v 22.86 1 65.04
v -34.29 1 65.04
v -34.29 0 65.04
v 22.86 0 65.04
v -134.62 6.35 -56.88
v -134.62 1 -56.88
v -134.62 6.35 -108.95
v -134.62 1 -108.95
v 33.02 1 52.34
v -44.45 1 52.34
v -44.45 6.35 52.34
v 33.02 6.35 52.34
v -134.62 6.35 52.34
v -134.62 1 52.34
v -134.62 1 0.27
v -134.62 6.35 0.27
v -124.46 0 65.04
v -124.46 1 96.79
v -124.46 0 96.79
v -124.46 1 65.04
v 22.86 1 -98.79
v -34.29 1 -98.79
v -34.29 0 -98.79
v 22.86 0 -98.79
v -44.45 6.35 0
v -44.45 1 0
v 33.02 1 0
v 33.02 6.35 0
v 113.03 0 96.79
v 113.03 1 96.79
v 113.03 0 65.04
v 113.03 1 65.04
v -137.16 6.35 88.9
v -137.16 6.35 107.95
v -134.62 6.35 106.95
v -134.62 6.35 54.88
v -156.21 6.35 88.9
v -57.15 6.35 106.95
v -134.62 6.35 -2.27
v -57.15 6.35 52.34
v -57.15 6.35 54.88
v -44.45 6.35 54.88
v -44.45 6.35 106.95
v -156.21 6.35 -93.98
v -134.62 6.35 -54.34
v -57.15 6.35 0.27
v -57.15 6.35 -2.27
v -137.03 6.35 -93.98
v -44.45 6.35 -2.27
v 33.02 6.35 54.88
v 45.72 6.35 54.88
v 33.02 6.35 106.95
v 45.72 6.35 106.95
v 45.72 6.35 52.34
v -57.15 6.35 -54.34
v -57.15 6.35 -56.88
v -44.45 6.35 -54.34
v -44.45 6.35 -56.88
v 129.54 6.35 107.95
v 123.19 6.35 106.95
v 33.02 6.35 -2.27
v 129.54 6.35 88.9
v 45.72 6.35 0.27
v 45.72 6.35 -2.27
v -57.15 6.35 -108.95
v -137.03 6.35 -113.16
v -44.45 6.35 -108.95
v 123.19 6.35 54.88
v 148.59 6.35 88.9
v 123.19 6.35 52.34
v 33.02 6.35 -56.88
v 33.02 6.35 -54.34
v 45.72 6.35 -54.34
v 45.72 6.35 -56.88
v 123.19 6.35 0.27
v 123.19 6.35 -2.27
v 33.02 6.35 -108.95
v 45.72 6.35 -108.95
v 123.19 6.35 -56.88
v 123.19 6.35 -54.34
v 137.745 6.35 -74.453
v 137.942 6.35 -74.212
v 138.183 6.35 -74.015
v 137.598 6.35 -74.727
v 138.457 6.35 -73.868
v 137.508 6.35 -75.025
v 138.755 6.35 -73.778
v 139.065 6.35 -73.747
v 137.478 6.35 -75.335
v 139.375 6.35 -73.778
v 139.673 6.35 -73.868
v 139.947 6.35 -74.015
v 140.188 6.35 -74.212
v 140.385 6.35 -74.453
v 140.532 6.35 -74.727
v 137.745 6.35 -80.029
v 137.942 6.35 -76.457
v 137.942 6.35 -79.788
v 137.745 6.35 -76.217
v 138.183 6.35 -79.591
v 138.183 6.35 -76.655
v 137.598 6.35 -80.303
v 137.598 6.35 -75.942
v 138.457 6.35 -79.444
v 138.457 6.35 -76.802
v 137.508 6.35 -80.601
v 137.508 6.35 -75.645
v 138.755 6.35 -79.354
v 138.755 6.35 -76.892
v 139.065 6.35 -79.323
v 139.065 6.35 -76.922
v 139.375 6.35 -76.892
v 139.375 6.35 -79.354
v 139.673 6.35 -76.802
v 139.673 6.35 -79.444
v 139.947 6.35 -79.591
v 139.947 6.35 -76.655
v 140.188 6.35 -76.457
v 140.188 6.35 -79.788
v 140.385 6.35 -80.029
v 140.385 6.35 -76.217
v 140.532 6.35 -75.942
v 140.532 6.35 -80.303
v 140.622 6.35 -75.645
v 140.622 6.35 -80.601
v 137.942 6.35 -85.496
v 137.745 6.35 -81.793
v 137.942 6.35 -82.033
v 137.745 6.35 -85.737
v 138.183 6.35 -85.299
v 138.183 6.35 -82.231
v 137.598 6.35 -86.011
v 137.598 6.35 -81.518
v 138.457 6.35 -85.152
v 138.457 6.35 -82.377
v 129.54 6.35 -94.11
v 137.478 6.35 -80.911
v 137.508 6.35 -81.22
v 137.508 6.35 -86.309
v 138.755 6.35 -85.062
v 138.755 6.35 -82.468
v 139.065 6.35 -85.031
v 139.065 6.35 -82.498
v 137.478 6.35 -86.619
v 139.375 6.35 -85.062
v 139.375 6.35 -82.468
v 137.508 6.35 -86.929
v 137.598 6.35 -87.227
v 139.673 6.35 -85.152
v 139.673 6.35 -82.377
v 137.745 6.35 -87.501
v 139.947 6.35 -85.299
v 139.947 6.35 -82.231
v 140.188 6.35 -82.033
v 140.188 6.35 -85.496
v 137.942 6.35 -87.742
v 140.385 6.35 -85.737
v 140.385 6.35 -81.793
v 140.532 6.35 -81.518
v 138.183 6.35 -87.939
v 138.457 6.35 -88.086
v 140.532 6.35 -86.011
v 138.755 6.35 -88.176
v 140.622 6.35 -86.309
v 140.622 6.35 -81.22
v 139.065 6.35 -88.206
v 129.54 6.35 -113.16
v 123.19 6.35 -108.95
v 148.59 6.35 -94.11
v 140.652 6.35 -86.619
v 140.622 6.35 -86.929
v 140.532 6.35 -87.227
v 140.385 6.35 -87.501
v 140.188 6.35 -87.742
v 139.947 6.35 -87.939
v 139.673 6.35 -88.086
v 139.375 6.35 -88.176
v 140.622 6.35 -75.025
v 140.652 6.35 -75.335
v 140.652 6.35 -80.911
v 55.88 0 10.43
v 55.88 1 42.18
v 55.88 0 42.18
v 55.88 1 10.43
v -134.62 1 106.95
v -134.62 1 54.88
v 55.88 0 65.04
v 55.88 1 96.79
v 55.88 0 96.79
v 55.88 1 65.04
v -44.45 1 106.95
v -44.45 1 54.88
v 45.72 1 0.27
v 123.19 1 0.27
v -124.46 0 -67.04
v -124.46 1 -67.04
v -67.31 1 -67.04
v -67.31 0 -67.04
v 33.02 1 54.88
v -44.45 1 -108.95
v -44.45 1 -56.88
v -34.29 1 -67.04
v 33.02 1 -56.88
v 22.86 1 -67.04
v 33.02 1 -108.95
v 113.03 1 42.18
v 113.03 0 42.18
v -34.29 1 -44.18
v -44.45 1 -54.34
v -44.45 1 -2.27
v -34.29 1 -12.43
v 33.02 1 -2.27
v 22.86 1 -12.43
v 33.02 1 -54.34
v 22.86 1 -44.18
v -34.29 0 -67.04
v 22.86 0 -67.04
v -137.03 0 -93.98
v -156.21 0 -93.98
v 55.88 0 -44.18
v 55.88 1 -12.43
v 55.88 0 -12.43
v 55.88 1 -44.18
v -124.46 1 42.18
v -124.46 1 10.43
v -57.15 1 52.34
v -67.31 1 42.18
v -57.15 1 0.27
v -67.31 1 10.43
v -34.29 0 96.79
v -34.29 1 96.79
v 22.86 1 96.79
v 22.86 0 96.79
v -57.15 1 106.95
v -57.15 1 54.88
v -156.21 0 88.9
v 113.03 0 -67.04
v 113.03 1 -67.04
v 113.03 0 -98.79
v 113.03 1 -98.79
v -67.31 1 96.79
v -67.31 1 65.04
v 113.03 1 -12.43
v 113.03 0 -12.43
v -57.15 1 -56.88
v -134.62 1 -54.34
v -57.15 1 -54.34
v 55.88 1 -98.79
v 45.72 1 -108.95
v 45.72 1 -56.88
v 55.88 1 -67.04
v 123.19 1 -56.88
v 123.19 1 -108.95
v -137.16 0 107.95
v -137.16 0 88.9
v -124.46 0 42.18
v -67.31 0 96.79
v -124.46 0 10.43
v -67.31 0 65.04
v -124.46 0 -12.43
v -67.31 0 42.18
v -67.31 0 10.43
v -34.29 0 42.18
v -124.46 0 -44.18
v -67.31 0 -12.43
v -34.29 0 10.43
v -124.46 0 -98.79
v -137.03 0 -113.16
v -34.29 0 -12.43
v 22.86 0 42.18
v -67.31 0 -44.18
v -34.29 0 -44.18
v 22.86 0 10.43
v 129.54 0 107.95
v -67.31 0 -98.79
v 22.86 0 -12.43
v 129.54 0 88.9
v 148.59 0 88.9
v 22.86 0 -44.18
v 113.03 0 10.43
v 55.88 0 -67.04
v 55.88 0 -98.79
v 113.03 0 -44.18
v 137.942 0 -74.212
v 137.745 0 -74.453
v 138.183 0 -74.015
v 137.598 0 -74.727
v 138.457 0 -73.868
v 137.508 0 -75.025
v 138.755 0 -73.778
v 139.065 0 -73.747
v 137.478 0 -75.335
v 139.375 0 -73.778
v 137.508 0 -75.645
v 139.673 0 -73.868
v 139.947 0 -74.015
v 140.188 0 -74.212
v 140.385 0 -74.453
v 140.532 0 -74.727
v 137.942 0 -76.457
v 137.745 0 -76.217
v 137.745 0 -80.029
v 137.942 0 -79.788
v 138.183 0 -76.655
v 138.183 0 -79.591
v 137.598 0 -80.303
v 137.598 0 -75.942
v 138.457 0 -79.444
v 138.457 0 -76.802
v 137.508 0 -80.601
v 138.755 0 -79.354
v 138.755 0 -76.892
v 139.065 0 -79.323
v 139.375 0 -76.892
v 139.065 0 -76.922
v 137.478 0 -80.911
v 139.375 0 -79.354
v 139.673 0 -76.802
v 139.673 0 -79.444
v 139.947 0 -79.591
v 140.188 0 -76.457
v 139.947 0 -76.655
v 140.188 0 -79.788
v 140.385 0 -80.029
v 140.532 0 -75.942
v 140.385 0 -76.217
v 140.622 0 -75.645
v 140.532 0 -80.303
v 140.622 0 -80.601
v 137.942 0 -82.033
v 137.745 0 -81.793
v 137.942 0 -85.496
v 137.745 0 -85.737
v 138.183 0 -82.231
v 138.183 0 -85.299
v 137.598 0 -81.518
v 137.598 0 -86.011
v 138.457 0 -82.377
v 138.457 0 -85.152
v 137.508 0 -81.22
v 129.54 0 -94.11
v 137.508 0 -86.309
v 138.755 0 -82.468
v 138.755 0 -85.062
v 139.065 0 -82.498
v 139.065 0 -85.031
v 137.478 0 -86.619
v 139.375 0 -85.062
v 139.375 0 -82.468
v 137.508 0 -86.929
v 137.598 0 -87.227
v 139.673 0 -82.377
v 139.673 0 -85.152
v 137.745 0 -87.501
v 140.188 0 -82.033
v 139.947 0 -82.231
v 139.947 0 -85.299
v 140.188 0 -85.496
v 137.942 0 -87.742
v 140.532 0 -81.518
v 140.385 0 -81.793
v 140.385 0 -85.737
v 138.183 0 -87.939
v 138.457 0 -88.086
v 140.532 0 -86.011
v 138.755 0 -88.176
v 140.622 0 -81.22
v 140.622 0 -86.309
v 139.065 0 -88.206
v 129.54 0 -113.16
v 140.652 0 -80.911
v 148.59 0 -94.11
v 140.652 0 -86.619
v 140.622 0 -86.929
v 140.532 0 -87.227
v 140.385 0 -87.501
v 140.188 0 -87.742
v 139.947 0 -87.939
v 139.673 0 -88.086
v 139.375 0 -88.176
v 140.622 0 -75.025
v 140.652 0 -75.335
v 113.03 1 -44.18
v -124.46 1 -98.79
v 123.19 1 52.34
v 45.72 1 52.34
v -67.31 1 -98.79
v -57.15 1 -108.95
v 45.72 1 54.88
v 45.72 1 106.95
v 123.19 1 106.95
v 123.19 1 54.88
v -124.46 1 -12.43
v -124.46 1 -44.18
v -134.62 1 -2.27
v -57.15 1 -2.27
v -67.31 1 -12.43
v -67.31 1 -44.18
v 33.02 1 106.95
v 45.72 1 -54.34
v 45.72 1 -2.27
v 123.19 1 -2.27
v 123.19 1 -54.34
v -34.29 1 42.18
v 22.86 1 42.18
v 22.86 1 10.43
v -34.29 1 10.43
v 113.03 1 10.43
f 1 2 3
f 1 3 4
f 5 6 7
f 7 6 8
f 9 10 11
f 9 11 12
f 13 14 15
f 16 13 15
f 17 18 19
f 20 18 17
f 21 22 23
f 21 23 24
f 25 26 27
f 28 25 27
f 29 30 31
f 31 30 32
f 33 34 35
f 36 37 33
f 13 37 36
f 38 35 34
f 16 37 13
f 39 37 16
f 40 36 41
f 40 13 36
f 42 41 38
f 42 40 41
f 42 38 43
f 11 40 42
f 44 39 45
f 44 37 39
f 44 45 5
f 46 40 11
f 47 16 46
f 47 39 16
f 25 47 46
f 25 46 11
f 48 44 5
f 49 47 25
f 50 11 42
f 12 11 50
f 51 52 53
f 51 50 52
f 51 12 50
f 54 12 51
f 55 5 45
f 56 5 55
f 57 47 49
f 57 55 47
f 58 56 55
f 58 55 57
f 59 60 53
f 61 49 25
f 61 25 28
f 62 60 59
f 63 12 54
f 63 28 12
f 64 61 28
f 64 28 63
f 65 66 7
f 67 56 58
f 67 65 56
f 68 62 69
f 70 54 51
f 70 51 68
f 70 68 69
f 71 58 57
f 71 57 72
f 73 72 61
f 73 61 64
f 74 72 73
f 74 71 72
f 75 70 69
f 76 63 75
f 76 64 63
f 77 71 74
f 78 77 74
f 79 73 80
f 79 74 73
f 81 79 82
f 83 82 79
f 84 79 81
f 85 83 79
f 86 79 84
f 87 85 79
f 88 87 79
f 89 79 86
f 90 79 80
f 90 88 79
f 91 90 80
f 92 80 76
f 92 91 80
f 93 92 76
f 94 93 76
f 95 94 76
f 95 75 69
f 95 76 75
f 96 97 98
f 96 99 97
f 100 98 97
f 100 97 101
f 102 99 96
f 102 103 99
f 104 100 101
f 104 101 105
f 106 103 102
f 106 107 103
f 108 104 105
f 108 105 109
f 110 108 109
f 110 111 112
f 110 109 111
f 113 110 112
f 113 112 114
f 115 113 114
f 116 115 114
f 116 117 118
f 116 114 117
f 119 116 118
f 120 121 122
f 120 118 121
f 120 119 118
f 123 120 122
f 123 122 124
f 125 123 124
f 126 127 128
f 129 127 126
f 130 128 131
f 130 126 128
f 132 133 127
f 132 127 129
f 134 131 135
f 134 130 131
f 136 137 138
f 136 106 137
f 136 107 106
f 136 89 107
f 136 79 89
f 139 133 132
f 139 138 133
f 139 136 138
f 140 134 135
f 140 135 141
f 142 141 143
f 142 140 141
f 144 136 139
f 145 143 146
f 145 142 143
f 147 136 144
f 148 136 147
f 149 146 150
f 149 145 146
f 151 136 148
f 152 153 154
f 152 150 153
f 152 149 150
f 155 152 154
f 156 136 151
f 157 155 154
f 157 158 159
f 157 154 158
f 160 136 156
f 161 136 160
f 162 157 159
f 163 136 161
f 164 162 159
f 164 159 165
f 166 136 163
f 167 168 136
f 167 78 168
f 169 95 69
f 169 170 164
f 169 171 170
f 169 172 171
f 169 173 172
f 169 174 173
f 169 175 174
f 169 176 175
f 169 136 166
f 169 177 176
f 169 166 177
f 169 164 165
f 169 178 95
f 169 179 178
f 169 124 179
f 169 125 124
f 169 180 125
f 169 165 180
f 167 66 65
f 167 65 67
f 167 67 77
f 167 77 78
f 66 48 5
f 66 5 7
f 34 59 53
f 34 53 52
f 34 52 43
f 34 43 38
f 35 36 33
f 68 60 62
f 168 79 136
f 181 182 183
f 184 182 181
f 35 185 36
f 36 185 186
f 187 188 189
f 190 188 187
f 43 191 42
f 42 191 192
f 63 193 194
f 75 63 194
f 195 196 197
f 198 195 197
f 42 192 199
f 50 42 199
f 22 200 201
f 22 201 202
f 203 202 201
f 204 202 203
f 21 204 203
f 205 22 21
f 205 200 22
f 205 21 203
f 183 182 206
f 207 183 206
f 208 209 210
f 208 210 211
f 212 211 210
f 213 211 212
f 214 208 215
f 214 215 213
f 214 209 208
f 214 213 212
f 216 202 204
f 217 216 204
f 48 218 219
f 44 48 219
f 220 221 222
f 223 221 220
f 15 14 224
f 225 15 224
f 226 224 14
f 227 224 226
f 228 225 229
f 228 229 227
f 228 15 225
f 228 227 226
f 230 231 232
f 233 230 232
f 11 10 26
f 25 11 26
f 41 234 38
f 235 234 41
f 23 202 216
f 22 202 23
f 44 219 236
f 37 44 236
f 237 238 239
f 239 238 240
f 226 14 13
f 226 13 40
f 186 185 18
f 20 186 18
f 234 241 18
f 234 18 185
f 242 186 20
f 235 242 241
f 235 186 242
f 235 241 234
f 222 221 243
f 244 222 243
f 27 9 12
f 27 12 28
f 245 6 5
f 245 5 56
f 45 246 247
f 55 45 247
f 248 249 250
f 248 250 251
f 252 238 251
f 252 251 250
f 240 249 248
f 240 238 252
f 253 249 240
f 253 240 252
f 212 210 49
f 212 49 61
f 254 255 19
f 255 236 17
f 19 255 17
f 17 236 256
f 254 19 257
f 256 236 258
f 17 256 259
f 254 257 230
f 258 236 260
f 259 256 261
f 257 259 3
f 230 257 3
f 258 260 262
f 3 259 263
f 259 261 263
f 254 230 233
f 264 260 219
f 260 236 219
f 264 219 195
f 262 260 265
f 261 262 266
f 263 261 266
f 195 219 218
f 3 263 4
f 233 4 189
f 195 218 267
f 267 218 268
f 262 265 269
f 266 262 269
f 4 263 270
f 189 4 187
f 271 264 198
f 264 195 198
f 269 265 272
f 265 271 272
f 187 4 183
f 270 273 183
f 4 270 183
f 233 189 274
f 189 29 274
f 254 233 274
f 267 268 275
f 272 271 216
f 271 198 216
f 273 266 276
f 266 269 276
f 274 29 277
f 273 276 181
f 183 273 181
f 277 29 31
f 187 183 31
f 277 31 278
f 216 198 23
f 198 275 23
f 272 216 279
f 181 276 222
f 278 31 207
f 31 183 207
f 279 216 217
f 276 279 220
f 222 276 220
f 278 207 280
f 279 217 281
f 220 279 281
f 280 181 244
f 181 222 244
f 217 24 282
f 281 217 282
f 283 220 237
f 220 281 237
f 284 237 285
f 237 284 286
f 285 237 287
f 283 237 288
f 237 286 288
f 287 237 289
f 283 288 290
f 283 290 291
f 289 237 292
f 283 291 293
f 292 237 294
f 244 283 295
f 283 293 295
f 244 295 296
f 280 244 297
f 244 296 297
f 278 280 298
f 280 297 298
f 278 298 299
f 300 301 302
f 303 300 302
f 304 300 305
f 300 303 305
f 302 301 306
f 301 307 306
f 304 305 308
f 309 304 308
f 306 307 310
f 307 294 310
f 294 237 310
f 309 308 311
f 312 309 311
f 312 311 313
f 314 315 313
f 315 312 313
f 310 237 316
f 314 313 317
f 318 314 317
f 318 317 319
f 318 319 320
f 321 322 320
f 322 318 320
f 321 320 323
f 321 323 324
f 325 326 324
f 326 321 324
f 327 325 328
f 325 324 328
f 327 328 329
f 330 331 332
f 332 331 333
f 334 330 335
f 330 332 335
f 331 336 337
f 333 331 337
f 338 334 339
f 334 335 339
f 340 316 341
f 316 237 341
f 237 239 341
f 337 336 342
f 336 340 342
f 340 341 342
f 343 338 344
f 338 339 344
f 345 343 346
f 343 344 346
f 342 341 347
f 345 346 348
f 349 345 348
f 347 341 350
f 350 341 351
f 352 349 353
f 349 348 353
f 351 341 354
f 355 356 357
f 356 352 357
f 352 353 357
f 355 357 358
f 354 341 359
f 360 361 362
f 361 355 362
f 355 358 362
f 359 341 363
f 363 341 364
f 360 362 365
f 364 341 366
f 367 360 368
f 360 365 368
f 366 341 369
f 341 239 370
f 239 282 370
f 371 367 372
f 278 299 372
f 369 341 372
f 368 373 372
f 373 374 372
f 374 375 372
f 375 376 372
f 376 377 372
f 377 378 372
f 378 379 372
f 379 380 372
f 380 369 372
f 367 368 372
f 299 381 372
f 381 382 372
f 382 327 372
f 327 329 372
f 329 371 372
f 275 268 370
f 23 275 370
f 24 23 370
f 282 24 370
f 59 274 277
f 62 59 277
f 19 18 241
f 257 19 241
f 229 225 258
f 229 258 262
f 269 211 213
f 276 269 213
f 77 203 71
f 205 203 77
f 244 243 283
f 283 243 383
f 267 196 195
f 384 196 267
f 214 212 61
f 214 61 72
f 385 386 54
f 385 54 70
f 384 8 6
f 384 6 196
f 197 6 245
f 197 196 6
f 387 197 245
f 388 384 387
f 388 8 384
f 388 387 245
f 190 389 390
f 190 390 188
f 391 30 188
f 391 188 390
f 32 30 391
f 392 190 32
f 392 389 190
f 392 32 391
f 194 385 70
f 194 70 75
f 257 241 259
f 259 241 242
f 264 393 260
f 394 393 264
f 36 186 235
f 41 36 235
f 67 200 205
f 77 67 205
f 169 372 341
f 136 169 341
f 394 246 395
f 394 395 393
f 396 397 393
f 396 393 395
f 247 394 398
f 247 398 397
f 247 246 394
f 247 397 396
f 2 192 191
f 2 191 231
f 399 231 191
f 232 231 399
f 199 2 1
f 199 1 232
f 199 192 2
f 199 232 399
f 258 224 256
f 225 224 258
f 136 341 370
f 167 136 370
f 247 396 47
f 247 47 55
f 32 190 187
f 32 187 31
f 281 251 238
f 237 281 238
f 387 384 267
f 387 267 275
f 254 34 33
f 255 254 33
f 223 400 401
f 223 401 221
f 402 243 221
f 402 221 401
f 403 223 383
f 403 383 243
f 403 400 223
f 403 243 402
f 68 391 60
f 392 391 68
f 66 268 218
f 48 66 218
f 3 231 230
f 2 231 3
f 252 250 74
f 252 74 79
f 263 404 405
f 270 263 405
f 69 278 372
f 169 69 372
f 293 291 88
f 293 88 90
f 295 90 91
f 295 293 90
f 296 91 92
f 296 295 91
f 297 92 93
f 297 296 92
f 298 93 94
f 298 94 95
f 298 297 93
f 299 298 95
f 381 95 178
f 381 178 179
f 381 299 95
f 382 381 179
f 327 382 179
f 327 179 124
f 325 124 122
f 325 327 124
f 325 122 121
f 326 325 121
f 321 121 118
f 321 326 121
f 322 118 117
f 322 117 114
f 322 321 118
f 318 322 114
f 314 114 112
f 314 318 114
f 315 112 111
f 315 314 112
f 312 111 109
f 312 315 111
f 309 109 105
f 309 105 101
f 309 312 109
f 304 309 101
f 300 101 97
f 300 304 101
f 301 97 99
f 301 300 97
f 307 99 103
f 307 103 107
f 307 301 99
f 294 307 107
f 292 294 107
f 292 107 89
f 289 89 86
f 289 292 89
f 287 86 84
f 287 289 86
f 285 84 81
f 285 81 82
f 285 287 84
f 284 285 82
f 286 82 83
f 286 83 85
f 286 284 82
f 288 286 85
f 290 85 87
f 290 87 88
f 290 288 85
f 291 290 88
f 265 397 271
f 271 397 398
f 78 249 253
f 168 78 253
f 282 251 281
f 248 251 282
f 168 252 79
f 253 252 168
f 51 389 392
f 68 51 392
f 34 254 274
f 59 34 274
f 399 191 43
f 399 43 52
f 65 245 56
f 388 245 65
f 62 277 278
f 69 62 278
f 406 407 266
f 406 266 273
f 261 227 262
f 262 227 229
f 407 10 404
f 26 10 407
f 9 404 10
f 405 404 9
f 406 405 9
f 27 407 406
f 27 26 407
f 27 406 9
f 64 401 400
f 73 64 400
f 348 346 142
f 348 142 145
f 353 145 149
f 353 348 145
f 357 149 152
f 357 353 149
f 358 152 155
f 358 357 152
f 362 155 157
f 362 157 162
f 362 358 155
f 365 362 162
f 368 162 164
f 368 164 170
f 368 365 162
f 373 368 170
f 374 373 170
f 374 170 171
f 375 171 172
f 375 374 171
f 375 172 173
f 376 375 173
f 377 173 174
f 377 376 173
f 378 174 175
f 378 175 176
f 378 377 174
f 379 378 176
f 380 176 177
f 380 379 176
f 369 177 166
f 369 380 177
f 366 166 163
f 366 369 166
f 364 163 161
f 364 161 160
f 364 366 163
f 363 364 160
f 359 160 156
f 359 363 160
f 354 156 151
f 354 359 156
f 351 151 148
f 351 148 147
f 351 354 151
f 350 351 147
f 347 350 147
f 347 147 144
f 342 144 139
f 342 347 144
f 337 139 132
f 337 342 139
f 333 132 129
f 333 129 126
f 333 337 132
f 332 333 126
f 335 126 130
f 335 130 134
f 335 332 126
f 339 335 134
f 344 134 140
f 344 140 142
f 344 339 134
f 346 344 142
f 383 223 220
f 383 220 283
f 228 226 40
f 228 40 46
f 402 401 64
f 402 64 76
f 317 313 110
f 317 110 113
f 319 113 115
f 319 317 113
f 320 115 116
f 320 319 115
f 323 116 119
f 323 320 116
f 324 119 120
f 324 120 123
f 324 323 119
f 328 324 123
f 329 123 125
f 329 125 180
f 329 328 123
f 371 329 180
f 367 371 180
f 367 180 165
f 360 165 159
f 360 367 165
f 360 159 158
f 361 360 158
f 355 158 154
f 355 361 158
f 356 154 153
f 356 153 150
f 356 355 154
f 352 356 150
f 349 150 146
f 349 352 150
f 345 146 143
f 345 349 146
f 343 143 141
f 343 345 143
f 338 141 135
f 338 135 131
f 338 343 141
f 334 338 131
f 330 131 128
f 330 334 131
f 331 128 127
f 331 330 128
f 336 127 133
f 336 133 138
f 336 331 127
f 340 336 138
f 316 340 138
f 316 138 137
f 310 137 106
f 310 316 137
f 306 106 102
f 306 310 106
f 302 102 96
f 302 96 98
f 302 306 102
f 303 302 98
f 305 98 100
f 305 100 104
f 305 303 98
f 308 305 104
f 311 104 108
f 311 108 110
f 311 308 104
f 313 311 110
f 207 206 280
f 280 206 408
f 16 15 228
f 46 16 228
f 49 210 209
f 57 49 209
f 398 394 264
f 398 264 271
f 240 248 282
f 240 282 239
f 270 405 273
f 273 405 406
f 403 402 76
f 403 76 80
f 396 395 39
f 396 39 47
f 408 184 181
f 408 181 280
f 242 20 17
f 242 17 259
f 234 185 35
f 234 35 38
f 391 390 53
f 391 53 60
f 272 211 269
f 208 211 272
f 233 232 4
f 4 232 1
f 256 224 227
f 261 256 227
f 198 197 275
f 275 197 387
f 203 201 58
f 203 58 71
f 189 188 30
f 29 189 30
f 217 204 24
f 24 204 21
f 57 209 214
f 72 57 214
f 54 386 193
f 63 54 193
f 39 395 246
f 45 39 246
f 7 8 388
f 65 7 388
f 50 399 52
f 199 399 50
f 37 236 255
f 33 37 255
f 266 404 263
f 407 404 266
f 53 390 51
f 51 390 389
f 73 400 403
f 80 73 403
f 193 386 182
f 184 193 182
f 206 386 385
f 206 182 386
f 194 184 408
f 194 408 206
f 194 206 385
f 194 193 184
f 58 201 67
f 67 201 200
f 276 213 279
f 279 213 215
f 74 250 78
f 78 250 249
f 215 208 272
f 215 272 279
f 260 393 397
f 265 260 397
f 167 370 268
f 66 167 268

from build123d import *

# Parameters (mm, degrees)
SKETCH1_W           = 77.47
SKETCH1_H           = 52.07
SKETCH1_R           = 1.5875
SKETCH1_H_2         = 52.34
BOSS_EXTRUDE3_DEPTH = 6.35
SKETCH2_W           = 19.05
SKETCH2_H           = 1
CUT_EXTRUDE1_DEPTH  = 193.995155978
SKETCH4_W           = 19.05
SKETCH4_H           = 1
CUT_EXTRUDE2_DEPTH  = 193.995155978
SKETCH5_W           = 257.81
SKETCH5_H           = 1
BOSS_EXTRUDE4_DEPTH = 215.9
SKETCH6_W           = 57.15
SKETCH6_H           = 31.75
CUT_EXTRUDE3_DEPTH  = 193.964841955


with BuildPart() as part:
    # Sketch1 → Boss-Extrude3 (new body)
    with BuildSketch(Plane(origin=(0, 0, 0), x_dir=(1, 0, 0), z_dir=(0, 1, 0))):
        Polygon((148.59, 94.11025641), (129.54, 94.11025641), (129.54, 113.16025641), (-137.02974359, 113.16025641), (-137.02974359, 93.98), (-156.21, 93.98), (-156.21, -88.9), (-137.16, -88.9), (-137.16, -106.95), (-156.21, -106.95), (-156.21, -107.95), (148.59, -107.95), (148.59, -106.95), (129.54, -106.95), (129.54, -88.9), (148.59, -88.9), align=None)
        with Locations((-95.885, -80.915)):
            Rectangle(SKETCH1_W, SKETCH1_H, mode=Mode.SUBTRACT)
        with Locations((-5.715, -80.915)):
            Rectangle(SKETCH1_W, SKETCH1_H, mode=Mode.SUBTRACT)
        with Locations((84.455, -80.915)):
            Rectangle(SKETCH1_W, SKETCH1_H, mode=Mode.SUBTRACT)
        with Locations((84.455, 82.915)):
            Rectangle(SKETCH1_W, SKETCH1_H, mode=Mode.SUBTRACT)
        with Locations((84.455, 28.305)):
            Rectangle(SKETCH1_W, SKETCH1_H, mode=Mode.SUBTRACT)
        with Locations((84.455, -26.305)):
            Rectangle(SKETCH1_W, SKETCH1_H, mode=Mode.SUBTRACT)
        with Locations(Location((139.065, 75.334869264, 0), (0, 0, 270))):
            Circle(SKETCH1_R, mode=Mode.SUBTRACT)
        with Locations(Location((139.065, 80.910552749, 0), (0, 0, 270))):
            Circle(SKETCH1_R, mode=Mode.SUBTRACT)
        with Locations(Location((139.065, 86.618990604, 0), (0, 0, 270))):
            Circle(SKETCH1_R, mode=Mode.SUBTRACT)
        with Locations((-5.715, 82.915)):
            Rectangle(SKETCH1_W, SKETCH1_H, mode=Mode.SUBTRACT)
        with Locations((-95.885, -26.305)):
            Rectangle(SKETCH1_W, SKETCH1_H, mode=Mode.SUBTRACT)
        with Locations((-5.715, -26.17)):
            Rectangle(SKETCH1_W, SKETCH1_H_2, mode=Mode.SUBTRACT)
        with Locations((-95.885, 28.305)):
            Rectangle(SKETCH1_W, SKETCH1_H, mode=Mode.SUBTRACT)
        with Locations((-5.715, 28.305)):
            Rectangle(SKETCH1_W, SKETCH1_H, mode=Mode.SUBTRACT)
        with Locations((-95.885, 82.915)):
            Rectangle(SKETCH1_W, SKETCH1_H, mode=Mode.SUBTRACT)
    extrude(amount=BOSS_EXTRUDE3_DEPTH)

    # Sketch2 → Cut-Extrude1 (cut, through all)
    with BuildSketch(Plane(origin=(0, 6.35, 0), x_dir=(1, 0, 0), z_dir=(0, 1, 0))):
        with Locations((139.065, -107.45)):
            Rectangle(SKETCH2_W, SKETCH2_H)
    extrude(amount=-CUT_EXTRUDE1_DEPTH, mode=Mode.SUBTRACT)

    # Sketch4 → Cut-Extrude2 (cut, through all)
    with BuildSketch(Plane(origin=(0, 6.35, 0), x_dir=(1, 0, 0), z_dir=(0, 1, 0))):
        with Locations((-146.685, -107.45)):
            Rectangle(SKETCH4_W, SKETCH4_H)
    extrude(amount=-CUT_EXTRUDE2_DEPTH, mode=Mode.SUBTRACT)

    # Sketch5 → Boss-Extrude4 (add)
    with BuildSketch(Plane.XY.offset(-108.95)):
        with Locations((-5.715, 0.5)):
            Rectangle(SKETCH5_W, SKETCH5_H)
    extrude(amount=BOSS_EXTRUDE4_DEPTH)

    # Sketch6 → Cut-Extrude3 (cut, through all)
    with BuildSketch(Plane(origin=(0, 1, 0), x_dir=(1, 0, 0), z_dir=(0, 1, 0))):
        with Locations((-95.885, 82.915)):
            Rectangle(SKETCH6_W, SKETCH6_H)
        with Locations((-95.885, 28.305)):
            Rectangle(SKETCH6_W, SKETCH6_H)
        with Locations((-95.885, -26.305)):
            Rectangle(SKETCH6_W, SKETCH6_H)
        with Locations((-95.885, -80.915)):
            Rectangle(SKETCH6_W, SKETCH6_H)
        with Locations((-5.715, 82.915)):
            Rectangle(SKETCH6_W, SKETCH6_H)
        with Locations((84.455, 82.915)):
            Rectangle(SKETCH6_W, SKETCH6_H)
        with Locations((-5.715, 28.305)):
            Rectangle(SKETCH6_W, SKETCH6_H)
        with Locations((-5.715, -26.305)):
            Rectangle(SKETCH6_W, SKETCH6_H)
        with Locations((-5.715, -80.915)):
            Rectangle(SKETCH6_W, SKETCH6_H)
        with Locations((84.455, -80.915)):
            Rectangle(SKETCH6_W, SKETCH6_H)
        with Locations((84.455, -26.305)):
            Rectangle(SKETCH6_W, SKETCH6_H)
        with Locations((84.455, 28.305)):
            Rectangle(SKETCH6_W, SKETCH6_H)
    extrude(amount=-CUT_EXTRUDE3_DEPTH, mode=Mode.SUBTRACT)


solid = part.part
